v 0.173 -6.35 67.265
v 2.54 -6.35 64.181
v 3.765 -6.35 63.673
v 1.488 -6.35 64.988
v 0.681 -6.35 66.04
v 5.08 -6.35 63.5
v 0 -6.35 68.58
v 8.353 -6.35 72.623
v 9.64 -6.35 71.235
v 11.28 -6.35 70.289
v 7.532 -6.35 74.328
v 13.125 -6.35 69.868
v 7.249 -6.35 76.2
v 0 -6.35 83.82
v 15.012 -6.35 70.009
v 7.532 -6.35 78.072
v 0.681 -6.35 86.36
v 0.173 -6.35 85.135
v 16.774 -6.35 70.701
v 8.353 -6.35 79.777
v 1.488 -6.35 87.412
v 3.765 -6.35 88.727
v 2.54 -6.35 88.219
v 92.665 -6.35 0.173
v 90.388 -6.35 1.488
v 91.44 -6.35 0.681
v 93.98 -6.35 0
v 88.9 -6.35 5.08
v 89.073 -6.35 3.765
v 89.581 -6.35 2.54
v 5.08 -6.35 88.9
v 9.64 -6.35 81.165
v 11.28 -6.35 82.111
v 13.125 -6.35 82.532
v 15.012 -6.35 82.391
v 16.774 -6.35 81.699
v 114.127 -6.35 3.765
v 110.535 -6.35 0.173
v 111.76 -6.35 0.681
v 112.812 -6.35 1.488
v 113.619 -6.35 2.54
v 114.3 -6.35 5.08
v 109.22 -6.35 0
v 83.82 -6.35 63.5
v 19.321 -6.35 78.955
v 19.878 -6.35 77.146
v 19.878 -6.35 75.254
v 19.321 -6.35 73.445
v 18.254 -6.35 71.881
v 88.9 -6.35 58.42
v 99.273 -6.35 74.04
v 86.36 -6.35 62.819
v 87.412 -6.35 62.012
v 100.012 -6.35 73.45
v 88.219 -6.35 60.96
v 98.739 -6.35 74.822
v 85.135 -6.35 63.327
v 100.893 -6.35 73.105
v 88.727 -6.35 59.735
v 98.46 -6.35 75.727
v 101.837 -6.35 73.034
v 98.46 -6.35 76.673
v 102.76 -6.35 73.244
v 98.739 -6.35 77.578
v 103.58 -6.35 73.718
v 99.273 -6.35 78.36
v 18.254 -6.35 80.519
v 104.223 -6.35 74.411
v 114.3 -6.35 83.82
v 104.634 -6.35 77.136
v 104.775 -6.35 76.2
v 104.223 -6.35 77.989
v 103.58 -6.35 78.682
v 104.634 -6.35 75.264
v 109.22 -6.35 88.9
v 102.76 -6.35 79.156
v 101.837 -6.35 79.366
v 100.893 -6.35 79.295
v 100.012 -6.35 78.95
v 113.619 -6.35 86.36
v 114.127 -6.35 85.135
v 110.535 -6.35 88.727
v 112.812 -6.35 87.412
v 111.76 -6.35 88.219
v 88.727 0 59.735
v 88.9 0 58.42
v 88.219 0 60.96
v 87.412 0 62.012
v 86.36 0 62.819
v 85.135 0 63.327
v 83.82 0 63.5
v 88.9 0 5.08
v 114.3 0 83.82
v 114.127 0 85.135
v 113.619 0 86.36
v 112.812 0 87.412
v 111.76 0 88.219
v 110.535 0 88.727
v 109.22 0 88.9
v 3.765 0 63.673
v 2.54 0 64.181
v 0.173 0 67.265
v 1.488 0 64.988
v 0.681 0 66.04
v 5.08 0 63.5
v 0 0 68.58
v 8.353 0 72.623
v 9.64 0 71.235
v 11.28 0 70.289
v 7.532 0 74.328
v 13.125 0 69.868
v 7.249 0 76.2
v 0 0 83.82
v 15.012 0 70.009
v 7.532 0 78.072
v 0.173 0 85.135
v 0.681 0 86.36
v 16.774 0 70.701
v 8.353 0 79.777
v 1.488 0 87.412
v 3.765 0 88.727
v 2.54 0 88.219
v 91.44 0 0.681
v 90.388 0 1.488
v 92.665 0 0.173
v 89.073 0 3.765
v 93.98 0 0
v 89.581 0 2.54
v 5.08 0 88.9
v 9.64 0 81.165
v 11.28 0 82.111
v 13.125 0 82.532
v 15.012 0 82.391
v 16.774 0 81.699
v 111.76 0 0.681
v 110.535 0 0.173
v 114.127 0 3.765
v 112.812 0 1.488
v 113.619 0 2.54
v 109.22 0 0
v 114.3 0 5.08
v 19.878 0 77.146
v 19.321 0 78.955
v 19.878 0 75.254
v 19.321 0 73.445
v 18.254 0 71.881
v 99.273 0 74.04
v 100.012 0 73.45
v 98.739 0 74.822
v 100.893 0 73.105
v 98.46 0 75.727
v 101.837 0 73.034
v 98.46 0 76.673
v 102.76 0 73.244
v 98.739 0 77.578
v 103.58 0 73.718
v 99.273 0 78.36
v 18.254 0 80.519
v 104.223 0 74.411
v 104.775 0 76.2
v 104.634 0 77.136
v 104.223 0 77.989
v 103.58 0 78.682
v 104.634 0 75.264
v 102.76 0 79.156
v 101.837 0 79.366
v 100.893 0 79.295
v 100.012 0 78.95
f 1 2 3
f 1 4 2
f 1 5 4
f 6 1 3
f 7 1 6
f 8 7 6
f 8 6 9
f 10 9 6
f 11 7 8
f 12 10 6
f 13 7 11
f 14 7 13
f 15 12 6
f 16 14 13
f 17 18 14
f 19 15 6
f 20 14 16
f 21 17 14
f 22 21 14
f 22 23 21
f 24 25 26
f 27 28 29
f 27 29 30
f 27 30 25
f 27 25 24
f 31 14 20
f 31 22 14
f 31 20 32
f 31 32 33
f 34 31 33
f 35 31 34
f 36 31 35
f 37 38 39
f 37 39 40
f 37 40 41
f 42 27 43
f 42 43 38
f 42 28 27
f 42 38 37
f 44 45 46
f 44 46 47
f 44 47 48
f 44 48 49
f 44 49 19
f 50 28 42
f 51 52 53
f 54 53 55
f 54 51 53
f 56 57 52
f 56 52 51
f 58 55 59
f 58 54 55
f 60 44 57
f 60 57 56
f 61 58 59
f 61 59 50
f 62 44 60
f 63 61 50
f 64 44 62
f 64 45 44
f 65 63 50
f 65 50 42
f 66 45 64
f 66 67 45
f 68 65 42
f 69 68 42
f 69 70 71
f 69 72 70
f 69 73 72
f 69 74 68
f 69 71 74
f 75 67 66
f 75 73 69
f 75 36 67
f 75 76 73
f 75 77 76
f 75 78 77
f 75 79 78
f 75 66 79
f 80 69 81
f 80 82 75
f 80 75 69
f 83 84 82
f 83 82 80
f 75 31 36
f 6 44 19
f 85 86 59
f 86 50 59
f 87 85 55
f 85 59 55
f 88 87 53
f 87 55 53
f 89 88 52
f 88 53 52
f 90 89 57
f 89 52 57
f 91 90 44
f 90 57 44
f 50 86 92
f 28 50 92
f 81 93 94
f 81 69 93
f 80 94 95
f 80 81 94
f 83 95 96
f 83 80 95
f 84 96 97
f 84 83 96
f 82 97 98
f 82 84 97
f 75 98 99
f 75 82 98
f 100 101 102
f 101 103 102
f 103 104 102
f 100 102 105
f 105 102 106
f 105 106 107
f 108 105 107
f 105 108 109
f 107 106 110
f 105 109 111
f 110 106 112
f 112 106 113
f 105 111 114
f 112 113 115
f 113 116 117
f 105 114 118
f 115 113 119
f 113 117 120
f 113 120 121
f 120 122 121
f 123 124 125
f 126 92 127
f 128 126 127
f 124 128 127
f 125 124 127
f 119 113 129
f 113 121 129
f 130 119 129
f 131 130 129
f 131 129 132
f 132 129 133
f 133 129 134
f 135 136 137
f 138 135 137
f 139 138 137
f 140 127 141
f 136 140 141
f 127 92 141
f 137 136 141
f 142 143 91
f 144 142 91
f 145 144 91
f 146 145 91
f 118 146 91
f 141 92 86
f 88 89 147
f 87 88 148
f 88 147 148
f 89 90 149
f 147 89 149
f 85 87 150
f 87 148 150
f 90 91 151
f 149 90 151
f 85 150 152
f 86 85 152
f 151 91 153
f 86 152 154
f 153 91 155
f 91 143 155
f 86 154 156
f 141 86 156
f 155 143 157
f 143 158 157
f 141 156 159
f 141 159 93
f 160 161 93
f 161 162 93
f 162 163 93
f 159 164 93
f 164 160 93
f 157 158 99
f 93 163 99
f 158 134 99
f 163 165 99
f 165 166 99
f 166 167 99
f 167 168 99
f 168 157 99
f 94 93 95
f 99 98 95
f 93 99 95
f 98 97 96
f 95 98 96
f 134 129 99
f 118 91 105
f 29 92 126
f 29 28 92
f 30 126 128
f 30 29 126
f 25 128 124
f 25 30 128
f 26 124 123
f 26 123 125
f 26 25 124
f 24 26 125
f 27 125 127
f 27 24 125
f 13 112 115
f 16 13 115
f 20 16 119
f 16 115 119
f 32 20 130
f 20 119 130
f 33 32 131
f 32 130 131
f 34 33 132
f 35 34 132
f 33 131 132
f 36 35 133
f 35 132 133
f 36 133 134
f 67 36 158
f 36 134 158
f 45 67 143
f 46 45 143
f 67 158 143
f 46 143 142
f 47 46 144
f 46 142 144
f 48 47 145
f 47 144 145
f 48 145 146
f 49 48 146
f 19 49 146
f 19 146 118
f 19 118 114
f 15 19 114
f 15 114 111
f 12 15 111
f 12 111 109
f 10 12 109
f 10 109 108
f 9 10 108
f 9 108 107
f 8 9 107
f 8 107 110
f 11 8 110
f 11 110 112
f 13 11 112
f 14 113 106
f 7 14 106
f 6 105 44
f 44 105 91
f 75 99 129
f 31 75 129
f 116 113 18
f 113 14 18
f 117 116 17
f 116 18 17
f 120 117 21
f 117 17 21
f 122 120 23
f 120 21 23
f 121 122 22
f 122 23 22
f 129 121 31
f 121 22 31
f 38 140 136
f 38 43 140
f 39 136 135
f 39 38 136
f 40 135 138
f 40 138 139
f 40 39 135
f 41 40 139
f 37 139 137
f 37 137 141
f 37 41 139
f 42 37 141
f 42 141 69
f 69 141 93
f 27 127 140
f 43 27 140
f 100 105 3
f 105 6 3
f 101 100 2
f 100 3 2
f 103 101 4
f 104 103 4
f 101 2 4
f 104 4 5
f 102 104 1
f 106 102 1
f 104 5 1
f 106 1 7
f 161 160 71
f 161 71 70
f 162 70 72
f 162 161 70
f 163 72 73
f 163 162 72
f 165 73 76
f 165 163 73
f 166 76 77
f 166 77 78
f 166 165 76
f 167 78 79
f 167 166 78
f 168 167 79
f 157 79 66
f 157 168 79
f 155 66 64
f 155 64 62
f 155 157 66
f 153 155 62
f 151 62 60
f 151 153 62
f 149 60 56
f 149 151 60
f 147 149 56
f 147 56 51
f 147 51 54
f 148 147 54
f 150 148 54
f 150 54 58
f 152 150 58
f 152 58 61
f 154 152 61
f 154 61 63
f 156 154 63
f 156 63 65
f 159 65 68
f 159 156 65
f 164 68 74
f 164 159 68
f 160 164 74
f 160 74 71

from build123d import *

# Parameters (mm, degrees)
F0_R     = 3.175
F1_DEPTH = 6.35
F2_R     = 5.08
F3_R     = 6.35
F4_DEPTH = 25.4


with BuildPart() as f1:
    # F0 (on Front) → F1 (new body)
    with BuildSketch(Plane.XZ):
        Polygon((88.9, 63.5), (88.9, 0), (114.3, 0), (114.3, 88.9), (0, 88.9), (0, 63.5), align=None)
        with Locations((101.6, 76.2)):
            Circle(F0_R, mode=Mode.SUBTRACT)
    extrude(amount=F1_DEPTH)

    # F2
    f2_edges = [f1.edges().sort_by_distance(p)[0] for p in [
        (0, -3.175, 63.5),
        (0, -3.175, 88.9),
        (114.3, -3.175, 88.9),
        (114.3, -3.175, 0),
        (88.9, -3.175, 0),
        (88.9, -3.175, 63.5),
    ]]
    fillet(f2_edges, radius=F2_R)

    # F3 (on face) → F4 (cut)
    with BuildSketch(Plane(origin=(0, 0, 0), x_dir=(-1, 0, 0), z_dir=(0, 1, 0))):
        with Locations((-13.5994189943, 76.2)):
            Circle(F3_R)
    extrude(amount=-F4_DEPTH, mode=Mode.SUBTRACT)


solid = f1.part
